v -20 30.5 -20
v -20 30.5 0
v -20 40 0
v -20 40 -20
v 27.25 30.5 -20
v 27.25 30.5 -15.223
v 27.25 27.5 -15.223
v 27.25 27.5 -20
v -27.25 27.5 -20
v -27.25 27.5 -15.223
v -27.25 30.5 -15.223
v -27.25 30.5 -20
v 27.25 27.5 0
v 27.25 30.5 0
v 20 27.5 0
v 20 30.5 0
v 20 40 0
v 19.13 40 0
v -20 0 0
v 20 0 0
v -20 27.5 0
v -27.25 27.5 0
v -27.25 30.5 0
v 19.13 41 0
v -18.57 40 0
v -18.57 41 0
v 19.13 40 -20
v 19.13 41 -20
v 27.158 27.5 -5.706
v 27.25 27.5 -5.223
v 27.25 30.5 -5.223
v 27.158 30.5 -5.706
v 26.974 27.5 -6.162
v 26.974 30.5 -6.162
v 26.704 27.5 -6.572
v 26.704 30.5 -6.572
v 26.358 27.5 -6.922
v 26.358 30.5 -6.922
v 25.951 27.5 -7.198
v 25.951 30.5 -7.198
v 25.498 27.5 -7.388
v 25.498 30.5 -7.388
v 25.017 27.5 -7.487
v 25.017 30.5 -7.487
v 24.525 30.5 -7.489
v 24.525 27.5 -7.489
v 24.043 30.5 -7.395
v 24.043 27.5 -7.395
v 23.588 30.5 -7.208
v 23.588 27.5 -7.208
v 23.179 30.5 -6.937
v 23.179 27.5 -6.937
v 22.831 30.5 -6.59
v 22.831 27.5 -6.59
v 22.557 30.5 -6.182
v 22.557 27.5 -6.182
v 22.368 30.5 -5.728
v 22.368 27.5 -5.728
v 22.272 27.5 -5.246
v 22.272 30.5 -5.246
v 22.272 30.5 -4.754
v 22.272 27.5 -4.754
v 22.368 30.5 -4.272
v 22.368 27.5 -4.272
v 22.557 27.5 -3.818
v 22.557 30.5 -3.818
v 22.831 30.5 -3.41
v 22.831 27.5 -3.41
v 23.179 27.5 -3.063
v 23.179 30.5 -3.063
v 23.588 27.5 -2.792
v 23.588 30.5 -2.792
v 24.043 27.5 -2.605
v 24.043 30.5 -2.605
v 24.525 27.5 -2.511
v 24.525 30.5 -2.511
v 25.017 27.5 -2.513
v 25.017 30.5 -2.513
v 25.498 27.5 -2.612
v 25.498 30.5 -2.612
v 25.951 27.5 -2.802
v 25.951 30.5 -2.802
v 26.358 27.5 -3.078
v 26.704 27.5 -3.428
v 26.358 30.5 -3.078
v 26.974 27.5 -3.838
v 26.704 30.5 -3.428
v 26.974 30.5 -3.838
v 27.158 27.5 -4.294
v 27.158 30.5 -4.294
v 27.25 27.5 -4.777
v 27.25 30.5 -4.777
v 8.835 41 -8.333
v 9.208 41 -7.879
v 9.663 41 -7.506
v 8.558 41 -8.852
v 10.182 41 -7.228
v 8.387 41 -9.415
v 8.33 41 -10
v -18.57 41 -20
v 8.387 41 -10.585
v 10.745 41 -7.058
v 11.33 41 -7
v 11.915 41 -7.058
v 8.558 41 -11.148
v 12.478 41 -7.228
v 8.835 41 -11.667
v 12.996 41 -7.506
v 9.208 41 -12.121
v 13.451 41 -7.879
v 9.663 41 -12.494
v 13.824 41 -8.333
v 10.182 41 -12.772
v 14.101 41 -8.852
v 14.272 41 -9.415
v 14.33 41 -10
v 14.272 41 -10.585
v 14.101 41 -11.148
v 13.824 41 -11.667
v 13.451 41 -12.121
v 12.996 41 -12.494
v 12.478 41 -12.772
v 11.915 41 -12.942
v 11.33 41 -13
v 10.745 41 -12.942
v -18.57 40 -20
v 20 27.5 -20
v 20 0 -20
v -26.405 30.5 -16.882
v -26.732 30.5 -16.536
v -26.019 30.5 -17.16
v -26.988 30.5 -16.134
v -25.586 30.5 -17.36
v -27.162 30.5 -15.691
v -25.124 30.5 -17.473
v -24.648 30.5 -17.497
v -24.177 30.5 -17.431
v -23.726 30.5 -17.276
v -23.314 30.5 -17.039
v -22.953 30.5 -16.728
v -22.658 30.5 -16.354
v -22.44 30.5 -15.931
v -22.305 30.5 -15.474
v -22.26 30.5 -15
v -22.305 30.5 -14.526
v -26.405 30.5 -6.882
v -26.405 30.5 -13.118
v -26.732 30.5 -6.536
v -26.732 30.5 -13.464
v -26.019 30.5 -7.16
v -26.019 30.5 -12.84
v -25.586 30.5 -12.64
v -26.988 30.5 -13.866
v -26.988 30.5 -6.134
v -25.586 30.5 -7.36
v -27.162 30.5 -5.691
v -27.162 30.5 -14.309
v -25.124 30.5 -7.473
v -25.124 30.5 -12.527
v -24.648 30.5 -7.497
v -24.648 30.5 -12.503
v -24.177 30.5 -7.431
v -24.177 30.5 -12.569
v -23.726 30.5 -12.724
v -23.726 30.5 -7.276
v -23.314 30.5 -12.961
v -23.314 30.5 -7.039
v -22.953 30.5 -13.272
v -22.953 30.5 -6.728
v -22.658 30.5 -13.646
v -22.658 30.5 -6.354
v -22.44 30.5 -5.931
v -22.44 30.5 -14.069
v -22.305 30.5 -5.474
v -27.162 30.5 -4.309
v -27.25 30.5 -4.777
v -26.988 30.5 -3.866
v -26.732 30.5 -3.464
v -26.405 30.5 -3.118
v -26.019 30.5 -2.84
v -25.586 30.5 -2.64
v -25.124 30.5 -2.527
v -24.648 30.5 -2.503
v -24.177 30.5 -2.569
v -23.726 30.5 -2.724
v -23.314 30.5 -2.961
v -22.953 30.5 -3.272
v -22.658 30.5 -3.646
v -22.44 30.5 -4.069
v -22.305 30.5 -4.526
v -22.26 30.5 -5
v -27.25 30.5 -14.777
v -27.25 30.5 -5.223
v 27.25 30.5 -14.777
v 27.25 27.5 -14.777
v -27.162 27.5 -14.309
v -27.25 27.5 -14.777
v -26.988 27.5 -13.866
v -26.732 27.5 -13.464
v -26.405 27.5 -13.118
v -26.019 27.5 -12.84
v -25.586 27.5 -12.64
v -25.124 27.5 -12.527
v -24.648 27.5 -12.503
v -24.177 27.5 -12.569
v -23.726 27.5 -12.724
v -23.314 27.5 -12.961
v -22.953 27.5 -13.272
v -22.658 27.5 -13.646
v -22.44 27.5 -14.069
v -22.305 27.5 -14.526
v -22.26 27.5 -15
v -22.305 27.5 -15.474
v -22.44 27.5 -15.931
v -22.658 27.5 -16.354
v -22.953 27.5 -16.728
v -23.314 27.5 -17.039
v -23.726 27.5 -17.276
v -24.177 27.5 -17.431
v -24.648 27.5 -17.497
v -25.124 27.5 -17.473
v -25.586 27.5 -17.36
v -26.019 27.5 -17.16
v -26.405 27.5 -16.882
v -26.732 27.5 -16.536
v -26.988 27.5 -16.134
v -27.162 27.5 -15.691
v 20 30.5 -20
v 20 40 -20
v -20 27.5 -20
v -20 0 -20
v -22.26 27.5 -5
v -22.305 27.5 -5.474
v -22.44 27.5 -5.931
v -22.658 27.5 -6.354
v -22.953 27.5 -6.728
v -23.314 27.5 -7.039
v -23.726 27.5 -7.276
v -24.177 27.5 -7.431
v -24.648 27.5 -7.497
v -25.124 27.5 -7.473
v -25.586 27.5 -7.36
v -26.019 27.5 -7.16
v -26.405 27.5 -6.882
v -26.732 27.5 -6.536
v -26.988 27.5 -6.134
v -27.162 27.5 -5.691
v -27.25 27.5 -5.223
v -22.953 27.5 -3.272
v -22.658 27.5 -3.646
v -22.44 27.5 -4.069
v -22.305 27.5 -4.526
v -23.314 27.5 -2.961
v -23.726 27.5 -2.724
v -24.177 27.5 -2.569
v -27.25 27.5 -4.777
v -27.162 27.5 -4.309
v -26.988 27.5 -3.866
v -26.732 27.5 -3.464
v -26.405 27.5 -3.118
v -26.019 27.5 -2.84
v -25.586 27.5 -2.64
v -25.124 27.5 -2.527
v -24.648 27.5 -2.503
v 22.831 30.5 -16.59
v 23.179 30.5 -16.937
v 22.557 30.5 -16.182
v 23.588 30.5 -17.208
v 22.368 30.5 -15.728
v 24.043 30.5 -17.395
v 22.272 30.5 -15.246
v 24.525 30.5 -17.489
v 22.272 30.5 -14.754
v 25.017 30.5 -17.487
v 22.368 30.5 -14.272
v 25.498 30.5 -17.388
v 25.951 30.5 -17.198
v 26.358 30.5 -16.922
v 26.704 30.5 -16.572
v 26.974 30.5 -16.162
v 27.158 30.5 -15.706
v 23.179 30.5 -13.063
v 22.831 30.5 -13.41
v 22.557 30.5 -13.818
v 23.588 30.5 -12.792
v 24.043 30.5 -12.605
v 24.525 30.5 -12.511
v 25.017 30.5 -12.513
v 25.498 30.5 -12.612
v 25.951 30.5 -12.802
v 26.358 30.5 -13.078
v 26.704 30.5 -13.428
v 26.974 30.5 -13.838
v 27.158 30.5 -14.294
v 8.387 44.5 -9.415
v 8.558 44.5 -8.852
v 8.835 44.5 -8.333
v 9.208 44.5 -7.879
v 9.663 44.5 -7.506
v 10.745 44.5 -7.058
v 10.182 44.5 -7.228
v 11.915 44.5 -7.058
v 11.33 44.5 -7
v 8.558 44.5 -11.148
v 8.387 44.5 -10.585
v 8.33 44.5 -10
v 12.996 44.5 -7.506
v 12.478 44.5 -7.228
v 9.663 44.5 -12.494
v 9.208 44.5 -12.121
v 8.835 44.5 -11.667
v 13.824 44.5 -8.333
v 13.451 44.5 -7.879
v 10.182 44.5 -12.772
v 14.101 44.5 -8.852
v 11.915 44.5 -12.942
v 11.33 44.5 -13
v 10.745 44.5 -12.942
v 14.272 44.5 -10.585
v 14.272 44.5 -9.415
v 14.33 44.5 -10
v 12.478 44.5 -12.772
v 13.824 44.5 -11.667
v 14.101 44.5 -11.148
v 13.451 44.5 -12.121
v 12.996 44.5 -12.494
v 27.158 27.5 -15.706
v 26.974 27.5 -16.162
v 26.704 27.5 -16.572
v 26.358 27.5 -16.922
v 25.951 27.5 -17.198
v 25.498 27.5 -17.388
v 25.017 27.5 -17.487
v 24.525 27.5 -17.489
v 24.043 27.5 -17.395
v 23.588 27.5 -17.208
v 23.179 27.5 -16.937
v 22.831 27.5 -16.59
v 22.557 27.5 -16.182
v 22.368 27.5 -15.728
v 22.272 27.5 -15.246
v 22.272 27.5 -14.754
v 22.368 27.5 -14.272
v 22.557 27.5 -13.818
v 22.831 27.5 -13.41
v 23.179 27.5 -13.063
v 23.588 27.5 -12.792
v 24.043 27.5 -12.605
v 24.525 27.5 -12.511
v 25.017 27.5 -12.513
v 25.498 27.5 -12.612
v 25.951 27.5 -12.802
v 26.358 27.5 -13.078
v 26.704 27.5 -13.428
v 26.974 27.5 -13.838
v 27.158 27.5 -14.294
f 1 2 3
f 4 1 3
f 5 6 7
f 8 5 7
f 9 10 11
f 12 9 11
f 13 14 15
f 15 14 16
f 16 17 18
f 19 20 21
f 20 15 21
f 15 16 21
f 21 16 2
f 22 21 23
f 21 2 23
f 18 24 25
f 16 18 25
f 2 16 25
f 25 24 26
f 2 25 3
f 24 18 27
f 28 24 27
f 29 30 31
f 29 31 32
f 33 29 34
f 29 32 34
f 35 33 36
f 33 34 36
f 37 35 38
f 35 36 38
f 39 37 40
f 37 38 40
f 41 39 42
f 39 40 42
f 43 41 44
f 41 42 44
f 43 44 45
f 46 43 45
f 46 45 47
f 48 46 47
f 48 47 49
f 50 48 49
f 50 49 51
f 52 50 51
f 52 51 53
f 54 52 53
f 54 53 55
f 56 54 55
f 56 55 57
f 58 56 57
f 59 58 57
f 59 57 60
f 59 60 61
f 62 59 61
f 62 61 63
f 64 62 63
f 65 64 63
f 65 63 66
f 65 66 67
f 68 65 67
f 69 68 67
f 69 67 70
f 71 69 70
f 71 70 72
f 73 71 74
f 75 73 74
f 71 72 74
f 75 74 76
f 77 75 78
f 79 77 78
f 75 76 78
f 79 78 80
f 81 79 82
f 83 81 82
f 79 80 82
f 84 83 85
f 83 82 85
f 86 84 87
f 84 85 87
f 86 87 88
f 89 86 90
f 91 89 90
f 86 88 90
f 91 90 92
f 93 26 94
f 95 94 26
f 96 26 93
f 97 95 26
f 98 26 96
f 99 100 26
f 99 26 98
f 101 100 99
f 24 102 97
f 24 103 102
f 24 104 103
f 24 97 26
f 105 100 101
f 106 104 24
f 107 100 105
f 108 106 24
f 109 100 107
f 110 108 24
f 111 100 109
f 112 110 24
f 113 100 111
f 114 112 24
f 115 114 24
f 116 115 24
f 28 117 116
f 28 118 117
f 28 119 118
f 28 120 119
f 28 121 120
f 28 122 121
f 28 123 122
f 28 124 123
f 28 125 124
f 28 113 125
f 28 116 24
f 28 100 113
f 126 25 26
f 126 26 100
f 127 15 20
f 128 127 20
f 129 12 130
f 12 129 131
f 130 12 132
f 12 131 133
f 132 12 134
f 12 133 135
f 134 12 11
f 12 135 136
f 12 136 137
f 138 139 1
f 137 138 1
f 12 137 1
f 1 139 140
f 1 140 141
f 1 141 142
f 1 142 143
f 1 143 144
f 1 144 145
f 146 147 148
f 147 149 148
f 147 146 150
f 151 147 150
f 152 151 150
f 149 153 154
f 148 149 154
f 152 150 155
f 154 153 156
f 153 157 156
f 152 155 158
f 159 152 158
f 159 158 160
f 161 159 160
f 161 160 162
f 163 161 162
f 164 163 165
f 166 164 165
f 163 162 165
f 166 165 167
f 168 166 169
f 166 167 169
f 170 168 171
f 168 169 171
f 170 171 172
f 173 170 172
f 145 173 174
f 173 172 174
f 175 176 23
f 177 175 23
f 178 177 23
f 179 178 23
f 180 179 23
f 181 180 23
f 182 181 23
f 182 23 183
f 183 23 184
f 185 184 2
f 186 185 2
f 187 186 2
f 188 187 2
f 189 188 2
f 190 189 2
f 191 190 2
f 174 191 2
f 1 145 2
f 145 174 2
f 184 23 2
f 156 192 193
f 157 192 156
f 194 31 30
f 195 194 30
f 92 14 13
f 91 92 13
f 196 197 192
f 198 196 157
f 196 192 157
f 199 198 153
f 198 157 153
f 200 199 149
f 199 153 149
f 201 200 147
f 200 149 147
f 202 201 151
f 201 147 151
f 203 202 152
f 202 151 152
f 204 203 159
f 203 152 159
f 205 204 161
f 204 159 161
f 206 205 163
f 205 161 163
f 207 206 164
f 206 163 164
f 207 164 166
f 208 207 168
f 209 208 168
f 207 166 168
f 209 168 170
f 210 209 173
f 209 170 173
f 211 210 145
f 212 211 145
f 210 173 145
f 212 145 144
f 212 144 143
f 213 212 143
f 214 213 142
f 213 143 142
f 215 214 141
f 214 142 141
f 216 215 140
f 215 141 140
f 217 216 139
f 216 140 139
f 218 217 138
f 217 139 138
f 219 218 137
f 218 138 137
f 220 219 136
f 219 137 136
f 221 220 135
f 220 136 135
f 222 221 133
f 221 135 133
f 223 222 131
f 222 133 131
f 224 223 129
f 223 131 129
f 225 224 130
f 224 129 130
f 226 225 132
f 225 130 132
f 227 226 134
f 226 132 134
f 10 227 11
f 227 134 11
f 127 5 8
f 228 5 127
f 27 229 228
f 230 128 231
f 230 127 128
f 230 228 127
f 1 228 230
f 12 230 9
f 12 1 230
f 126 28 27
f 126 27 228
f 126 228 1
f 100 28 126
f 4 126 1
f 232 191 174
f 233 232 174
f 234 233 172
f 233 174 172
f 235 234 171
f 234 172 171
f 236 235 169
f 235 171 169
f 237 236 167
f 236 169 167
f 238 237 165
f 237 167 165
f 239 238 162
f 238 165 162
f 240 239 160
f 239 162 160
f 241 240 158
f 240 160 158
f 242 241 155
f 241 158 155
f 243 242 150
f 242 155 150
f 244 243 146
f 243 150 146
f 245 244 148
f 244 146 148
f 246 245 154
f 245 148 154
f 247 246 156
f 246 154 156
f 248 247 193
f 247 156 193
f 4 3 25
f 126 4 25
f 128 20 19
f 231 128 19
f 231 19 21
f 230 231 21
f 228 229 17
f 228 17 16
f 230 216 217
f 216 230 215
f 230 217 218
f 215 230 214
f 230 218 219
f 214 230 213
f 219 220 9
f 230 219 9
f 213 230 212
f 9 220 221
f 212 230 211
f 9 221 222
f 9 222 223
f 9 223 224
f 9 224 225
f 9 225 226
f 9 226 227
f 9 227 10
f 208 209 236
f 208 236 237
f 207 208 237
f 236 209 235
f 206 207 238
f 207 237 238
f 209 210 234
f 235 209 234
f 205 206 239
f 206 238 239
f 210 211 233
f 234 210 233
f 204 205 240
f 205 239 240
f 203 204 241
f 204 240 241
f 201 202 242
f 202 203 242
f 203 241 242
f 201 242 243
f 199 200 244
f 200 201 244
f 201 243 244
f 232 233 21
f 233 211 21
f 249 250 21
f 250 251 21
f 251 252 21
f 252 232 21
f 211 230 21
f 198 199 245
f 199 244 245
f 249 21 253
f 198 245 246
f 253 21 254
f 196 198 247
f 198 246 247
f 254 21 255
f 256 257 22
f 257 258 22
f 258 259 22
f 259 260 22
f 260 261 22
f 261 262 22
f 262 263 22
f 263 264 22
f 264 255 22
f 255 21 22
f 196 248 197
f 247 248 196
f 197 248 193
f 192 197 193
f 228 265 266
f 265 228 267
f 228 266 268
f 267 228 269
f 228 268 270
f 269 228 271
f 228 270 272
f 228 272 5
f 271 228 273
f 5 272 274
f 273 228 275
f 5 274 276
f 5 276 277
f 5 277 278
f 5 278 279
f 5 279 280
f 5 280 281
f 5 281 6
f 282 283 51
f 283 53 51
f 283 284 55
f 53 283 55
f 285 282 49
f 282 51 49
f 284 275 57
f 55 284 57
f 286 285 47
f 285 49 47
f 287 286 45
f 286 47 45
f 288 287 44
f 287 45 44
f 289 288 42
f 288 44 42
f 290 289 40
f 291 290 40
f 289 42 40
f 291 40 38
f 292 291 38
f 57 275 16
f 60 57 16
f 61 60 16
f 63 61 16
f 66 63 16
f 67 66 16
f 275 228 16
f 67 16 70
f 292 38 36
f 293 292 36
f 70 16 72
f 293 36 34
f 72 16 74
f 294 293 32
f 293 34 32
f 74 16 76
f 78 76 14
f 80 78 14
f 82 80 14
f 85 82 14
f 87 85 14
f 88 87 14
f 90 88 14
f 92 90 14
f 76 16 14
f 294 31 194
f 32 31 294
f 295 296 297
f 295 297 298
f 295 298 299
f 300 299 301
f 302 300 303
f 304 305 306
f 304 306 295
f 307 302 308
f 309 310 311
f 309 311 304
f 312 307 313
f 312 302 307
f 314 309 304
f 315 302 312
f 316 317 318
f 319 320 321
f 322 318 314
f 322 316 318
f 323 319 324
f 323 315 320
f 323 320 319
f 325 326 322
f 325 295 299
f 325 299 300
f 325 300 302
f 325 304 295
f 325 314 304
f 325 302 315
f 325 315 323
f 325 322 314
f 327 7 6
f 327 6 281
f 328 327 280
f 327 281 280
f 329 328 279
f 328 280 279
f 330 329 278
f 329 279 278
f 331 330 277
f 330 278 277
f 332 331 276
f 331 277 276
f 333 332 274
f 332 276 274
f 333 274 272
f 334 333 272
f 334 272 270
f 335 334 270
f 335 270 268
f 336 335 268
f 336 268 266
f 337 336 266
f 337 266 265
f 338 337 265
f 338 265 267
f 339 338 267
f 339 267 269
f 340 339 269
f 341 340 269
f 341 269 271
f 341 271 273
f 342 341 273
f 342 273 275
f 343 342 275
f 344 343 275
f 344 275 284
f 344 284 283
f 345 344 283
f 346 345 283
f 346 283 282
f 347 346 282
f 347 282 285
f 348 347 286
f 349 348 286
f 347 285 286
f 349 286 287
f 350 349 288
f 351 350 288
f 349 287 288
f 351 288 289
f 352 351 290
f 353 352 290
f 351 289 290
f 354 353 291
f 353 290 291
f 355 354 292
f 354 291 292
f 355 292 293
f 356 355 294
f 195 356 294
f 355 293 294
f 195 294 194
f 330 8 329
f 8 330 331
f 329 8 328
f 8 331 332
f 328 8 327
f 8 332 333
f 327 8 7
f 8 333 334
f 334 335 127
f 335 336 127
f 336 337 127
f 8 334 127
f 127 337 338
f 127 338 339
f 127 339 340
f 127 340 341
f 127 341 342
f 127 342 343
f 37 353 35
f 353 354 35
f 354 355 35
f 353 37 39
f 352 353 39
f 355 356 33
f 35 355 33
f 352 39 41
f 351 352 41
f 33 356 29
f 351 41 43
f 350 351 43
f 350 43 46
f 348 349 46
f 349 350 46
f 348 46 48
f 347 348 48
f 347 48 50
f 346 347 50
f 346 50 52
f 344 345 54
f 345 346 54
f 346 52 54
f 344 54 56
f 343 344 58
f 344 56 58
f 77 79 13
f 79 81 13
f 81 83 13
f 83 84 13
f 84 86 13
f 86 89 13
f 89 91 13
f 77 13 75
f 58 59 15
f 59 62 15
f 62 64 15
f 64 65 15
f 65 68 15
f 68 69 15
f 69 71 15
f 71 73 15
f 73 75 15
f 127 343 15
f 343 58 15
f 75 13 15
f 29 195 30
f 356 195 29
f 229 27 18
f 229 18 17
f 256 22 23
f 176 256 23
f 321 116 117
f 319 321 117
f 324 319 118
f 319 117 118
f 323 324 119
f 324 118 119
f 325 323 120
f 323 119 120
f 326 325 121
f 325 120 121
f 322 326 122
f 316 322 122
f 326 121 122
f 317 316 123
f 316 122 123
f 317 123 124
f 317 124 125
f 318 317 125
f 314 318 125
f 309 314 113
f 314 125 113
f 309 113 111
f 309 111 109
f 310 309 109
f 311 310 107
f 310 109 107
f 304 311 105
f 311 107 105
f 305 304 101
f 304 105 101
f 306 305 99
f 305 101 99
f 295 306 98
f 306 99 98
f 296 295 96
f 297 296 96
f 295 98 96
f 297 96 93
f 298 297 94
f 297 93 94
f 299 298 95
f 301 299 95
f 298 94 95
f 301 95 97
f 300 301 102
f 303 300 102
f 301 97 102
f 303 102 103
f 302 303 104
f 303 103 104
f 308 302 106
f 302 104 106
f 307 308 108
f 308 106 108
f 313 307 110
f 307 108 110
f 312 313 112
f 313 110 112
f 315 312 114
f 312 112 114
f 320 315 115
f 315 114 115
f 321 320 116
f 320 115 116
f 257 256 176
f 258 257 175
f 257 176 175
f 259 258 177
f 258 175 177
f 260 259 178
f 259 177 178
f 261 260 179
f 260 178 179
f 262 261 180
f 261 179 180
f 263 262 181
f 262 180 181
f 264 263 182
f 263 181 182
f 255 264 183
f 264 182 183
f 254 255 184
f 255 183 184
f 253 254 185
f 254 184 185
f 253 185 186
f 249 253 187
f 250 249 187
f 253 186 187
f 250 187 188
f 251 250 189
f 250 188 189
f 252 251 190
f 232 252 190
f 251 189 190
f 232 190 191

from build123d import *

# Parameters (mm, degrees)
EXTRUDE_1_DEPTH     = 20
SKETCH_2_R          = 2.5
CUT_EXTRUDE_4_DEPTH = 20
SKETCH_3_W          = 37.700616616
SKETCH_3_H          = 20
EXTRUDE_3_DEPTH     = 1
SKETCH_4_R          = 3
EXTRUDE_4_DEPTH     = 3.5


with BuildPart() as part:
    # 草图1 → 凸台-拉伸1 (new body)
    with BuildSketch(Plane.XY):
        Polygon((20, 0), (-20, 0), (-20, 27.5), (-27.25, 27.5), (-27.25, 30.5), (-20, 30.5), (-20, 40), (20, 40), (20, 30.5), (27.25, 30.5), (27.25, 27.5), (20, 27.5), align=None)
    extrude(amount=-EXTRUDE_1_DEPTH)

    # 草图2 → 切除-拉伸4 (cut)
    with BuildSketch(Plane(origin=(0, 30.5, 0), x_dir=(1, 0, 0), z_dir=(0, 1, 0))):
        with Locations((-24.76, 15)):
            Circle(SKETCH_2_R)
        with Locations((-24.76, 5)):
            Circle(SKETCH_2_R)
        with Locations((24.76, 5)):
            Circle(SKETCH_2_R)
        with Locations((24.76, 15)):
            Circle(SKETCH_2_R)
    extrude(amount=-CUT_EXTRUDE_4_DEPTH, mode=Mode.SUBTRACT)

    # 草图3 → 凸台-拉伸3 (add)
    with BuildSketch(Plane(origin=(0, 40, 0), x_dir=(1, 0, 0), z_dir=(0, 1, 0))):
        with Locations((0.280093734, 10)):
            Rectangle(SKETCH_3_W, SKETCH_3_H)
    extrude(amount=EXTRUDE_3_DEPTH)

    # 草图4 → 凸台-拉伸4 (add)
    with BuildSketch(Plane(origin=(0, 41, 0), x_dir=(1, 0, 0), z_dir=(0, 1, 0))):
        with Locations((11.329785426, 10)):
            Circle(SKETCH_4_R)
    extrude(amount=EXTRUDE_4_DEPTH)


solid = part.part
